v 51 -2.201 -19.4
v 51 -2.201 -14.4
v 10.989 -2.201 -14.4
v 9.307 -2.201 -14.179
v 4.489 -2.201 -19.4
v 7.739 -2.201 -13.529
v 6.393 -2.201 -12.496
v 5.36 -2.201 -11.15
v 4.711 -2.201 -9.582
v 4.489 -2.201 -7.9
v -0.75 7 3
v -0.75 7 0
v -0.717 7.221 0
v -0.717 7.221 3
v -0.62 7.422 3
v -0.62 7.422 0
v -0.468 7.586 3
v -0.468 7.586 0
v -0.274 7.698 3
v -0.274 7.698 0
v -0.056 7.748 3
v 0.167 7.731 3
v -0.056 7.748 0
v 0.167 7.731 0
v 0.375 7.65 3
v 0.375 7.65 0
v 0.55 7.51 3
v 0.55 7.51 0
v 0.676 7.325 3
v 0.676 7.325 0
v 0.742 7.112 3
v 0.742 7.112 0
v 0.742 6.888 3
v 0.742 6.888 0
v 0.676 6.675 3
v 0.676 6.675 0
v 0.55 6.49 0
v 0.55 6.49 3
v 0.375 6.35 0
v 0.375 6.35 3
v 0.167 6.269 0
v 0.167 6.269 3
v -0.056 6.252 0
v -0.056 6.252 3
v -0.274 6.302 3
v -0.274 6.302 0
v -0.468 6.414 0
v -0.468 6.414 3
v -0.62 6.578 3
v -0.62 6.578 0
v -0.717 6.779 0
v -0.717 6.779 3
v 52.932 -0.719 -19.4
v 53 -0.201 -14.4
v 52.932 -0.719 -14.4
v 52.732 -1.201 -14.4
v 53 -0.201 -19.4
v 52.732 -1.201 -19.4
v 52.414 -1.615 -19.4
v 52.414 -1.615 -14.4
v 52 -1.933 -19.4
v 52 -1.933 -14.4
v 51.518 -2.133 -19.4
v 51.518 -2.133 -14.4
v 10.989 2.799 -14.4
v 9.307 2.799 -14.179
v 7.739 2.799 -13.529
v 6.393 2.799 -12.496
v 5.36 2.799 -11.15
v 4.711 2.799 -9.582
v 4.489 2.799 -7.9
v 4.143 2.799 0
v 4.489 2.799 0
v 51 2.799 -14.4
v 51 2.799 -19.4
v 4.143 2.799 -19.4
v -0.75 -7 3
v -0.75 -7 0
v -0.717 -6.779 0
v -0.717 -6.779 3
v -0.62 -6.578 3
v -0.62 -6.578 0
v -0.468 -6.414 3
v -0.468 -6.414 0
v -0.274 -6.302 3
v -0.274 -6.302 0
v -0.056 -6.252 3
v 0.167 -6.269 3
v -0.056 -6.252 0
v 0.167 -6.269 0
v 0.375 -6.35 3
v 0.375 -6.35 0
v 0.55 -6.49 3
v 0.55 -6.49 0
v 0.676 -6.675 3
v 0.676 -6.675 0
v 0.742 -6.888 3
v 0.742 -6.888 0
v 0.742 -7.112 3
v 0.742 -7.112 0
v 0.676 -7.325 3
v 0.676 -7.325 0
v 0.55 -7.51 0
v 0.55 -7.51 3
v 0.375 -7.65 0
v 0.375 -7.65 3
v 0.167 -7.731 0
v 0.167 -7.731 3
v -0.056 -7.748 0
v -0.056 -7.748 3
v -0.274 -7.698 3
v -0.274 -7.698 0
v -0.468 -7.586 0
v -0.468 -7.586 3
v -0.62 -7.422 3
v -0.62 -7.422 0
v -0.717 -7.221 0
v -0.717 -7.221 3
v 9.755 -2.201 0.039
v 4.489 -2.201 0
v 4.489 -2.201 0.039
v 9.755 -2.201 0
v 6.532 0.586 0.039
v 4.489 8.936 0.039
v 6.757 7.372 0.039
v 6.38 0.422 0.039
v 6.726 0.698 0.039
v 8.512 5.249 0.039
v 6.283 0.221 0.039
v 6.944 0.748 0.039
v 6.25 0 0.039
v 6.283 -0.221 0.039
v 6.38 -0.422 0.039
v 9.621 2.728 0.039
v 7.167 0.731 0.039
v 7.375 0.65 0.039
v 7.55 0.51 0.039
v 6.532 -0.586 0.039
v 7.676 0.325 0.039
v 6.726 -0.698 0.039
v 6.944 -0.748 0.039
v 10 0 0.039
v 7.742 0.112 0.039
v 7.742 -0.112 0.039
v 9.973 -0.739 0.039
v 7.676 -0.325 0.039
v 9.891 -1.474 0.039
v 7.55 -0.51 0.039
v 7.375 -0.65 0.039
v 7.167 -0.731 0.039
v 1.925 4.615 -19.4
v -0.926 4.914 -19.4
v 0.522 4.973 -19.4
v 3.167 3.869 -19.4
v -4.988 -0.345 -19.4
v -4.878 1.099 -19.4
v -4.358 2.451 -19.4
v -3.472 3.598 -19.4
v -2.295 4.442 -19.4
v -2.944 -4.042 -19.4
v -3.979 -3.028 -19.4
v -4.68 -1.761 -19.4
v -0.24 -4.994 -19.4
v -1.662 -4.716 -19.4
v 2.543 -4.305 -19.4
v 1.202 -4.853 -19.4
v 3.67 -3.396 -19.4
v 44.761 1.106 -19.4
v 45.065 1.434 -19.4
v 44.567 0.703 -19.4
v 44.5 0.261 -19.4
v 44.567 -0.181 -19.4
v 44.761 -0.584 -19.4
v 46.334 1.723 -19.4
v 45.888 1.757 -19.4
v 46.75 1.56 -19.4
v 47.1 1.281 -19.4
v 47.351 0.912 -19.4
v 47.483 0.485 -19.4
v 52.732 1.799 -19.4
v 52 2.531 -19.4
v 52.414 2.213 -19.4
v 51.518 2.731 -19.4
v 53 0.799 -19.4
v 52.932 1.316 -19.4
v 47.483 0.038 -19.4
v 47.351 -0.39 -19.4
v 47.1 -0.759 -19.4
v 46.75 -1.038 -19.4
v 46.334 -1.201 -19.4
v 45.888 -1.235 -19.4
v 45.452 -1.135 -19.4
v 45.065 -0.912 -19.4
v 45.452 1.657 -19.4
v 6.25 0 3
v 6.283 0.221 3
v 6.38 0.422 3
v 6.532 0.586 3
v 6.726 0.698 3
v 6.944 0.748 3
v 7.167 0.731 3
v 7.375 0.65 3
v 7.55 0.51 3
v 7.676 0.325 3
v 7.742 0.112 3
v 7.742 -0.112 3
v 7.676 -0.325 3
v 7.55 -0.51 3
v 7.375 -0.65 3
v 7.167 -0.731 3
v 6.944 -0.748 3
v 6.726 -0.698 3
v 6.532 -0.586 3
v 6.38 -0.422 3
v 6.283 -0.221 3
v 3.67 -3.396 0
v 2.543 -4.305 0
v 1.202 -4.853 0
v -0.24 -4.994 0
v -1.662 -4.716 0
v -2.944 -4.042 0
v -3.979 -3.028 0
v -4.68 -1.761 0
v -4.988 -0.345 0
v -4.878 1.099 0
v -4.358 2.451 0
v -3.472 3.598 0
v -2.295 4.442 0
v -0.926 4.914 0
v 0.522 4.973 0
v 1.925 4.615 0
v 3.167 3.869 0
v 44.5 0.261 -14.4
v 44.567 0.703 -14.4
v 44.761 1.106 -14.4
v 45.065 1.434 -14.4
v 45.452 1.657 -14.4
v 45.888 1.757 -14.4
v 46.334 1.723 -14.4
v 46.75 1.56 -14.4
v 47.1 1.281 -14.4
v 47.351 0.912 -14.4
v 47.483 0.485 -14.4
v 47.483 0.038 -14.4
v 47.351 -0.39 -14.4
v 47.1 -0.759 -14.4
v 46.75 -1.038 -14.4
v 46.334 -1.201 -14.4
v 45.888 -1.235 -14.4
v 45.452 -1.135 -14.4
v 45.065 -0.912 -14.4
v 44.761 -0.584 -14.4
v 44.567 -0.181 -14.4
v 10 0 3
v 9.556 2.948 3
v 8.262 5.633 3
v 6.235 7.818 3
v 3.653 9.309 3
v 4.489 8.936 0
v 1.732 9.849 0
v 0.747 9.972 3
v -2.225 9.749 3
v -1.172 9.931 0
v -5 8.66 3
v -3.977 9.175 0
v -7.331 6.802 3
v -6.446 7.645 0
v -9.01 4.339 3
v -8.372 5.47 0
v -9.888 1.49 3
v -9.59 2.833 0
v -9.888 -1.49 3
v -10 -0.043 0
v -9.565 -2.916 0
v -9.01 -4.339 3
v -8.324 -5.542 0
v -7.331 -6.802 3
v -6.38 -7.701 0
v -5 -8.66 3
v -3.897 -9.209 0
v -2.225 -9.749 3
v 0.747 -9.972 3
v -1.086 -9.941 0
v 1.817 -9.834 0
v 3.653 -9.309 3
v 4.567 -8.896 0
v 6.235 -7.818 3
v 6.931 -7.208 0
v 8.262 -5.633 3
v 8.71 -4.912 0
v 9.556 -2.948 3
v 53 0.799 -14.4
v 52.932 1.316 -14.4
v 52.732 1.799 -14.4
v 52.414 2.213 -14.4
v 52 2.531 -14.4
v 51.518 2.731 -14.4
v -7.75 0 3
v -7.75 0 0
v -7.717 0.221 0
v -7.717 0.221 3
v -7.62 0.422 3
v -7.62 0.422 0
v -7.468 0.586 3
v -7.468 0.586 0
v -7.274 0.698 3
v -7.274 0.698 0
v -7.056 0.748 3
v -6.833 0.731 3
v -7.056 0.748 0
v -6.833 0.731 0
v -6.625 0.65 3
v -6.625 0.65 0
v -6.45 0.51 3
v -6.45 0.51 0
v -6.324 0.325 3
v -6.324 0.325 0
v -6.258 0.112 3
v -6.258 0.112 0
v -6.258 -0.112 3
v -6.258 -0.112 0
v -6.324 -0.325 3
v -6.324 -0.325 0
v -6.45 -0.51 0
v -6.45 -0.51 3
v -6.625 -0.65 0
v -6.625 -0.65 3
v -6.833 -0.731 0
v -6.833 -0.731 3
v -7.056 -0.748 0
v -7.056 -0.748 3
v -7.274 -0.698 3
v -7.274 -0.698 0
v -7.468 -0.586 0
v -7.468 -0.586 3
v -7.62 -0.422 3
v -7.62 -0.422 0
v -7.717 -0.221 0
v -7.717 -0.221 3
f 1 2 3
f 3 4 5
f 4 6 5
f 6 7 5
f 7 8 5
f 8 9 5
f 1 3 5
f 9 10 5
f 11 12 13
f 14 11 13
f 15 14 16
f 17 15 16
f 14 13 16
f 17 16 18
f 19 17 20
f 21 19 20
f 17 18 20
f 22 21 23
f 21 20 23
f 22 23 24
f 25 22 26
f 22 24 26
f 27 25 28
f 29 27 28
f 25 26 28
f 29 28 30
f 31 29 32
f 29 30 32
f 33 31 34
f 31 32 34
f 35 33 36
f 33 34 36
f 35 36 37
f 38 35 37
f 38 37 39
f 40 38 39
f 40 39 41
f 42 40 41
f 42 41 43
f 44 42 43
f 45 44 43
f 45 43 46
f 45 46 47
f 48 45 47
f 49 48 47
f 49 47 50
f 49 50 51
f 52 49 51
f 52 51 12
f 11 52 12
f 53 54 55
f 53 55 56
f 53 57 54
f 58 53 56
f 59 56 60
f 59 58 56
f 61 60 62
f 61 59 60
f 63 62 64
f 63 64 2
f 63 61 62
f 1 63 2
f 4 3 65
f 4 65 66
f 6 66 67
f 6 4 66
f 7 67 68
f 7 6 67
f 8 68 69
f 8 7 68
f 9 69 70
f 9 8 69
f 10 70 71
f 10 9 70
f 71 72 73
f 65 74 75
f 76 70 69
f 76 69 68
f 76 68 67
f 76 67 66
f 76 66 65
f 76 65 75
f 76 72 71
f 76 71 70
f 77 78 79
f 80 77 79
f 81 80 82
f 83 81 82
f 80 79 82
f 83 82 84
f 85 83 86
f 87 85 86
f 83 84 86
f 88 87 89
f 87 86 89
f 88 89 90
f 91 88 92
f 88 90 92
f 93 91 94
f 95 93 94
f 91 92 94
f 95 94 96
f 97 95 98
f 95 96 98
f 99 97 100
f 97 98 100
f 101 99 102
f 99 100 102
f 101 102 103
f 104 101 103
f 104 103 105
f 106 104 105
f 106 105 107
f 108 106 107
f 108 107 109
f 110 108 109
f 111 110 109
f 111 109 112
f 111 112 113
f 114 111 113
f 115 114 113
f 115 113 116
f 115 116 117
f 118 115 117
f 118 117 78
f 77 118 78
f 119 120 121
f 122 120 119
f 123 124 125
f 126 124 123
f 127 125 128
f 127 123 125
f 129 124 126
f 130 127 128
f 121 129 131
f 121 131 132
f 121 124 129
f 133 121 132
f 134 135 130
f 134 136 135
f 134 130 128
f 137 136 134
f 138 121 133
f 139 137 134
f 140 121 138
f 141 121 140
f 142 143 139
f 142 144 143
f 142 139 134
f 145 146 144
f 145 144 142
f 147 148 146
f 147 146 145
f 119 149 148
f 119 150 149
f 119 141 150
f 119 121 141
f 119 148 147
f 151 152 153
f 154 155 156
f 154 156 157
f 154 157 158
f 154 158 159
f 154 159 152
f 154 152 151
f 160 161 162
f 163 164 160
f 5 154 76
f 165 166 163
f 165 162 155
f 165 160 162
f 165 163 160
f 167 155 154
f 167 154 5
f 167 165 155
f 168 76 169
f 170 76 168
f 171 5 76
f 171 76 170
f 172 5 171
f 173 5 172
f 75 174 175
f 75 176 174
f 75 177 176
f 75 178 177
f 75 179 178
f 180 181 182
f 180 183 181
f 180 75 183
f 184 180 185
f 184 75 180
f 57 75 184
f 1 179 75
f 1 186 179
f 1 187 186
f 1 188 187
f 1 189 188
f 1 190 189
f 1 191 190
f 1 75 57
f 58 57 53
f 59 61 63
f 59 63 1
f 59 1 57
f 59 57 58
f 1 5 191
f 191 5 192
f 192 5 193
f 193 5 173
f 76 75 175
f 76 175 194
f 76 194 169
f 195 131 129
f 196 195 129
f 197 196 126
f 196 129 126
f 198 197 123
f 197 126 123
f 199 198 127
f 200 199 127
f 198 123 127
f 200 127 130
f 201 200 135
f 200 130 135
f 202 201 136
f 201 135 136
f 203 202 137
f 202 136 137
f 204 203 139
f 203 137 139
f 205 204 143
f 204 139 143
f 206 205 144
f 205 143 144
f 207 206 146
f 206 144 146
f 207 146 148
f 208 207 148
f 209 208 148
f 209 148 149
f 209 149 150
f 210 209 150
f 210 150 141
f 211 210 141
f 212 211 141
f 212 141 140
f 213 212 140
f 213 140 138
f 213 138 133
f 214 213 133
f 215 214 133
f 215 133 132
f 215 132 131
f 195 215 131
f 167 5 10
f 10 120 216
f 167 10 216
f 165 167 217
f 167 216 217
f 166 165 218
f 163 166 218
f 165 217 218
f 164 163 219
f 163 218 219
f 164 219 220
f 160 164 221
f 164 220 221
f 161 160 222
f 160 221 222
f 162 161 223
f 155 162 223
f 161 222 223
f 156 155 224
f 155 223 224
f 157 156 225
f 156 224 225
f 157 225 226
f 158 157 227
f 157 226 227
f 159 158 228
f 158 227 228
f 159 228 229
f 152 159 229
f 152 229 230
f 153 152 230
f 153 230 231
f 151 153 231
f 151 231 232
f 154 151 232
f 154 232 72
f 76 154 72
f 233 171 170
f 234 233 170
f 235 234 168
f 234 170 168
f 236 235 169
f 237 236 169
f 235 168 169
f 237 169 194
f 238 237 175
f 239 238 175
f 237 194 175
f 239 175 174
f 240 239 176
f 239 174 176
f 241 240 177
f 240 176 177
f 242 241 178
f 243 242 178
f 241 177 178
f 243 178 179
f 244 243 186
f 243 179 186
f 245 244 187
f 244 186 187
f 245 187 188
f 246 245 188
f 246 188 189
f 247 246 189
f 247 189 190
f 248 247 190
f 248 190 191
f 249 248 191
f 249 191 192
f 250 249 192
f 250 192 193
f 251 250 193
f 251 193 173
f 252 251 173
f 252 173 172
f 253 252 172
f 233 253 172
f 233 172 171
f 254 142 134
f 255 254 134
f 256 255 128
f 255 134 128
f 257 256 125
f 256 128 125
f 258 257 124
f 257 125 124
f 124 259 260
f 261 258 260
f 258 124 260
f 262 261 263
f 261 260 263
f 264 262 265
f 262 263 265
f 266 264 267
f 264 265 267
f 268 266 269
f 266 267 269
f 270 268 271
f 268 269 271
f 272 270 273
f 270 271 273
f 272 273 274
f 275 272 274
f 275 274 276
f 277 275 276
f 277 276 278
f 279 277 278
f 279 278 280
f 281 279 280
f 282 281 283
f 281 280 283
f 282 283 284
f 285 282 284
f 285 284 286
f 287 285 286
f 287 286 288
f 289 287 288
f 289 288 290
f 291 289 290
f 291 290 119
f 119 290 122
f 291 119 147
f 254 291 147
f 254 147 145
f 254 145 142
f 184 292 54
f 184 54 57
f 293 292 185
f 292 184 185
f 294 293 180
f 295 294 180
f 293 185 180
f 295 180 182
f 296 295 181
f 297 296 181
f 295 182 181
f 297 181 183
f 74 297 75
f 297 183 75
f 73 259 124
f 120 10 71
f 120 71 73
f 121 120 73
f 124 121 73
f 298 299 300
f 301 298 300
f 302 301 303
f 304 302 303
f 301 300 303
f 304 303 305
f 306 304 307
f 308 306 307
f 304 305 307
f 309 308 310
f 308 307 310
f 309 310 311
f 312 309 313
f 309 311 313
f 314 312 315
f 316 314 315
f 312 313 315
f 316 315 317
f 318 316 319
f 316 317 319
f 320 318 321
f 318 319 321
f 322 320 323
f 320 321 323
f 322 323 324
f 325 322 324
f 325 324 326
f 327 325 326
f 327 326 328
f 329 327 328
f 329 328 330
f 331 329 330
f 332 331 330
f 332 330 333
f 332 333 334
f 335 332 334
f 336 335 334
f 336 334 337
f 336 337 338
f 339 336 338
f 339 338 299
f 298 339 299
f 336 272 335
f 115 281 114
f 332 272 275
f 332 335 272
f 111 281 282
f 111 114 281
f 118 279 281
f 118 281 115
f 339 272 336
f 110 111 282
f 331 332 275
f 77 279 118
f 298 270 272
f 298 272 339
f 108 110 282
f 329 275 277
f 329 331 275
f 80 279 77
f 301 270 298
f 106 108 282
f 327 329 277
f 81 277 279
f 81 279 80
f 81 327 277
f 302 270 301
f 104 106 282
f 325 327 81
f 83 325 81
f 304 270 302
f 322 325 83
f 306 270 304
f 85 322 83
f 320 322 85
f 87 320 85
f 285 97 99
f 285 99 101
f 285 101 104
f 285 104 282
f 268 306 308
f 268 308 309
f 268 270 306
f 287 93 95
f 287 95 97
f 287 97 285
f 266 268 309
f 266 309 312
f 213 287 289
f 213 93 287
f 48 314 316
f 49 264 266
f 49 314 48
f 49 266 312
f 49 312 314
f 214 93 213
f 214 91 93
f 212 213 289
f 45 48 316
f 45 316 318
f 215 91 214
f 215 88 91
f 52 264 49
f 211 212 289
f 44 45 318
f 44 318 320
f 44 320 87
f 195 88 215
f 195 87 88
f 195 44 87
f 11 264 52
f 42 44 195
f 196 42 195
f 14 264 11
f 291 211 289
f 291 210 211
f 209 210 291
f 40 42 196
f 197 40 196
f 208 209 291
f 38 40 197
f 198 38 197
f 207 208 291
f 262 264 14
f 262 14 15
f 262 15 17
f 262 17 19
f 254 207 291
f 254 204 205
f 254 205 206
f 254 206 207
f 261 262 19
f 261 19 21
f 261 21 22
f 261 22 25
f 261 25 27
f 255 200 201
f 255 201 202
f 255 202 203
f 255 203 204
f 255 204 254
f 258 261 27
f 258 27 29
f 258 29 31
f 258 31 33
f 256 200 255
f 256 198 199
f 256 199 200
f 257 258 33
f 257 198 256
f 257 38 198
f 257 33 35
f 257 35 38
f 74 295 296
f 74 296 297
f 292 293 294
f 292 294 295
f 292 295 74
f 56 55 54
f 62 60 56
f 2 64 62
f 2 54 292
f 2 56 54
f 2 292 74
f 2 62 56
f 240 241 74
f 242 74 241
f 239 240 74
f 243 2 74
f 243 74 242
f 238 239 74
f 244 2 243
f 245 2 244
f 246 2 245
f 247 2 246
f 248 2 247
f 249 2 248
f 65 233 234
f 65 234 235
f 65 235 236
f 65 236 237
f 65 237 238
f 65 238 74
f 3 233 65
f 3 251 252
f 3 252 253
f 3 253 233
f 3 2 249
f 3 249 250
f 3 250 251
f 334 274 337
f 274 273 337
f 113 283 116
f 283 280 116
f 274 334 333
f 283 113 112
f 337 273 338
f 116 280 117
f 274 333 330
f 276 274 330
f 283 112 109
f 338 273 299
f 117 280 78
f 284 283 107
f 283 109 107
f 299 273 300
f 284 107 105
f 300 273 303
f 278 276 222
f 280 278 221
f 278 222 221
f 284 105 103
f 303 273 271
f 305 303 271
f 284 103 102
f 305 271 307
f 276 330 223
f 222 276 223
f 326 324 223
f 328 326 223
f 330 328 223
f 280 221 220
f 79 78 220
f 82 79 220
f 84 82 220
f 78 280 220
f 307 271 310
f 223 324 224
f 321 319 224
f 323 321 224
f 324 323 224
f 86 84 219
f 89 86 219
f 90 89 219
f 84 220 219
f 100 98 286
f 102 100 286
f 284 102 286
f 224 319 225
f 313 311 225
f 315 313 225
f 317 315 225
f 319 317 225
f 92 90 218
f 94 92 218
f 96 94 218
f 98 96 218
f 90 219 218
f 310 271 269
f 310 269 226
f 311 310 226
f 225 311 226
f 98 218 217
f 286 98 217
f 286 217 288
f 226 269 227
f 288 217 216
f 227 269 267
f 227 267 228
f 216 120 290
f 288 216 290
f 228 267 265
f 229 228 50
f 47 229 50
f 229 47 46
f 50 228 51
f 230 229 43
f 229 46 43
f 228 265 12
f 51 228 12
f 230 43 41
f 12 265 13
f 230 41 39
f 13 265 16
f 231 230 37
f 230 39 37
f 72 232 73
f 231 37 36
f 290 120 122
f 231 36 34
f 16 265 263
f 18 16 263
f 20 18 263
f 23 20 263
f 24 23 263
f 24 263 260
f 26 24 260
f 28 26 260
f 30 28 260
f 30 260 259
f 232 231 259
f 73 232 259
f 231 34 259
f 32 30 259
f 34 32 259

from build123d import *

# Parameters (mm, degrees)
SKETCH_1_R          = 10
EXTRUDE_1_DEPTH     = 3
SKETCH_2_R          = 0.75
CUT_EXTRUDE_1_DEPTH = 15.456832295
SKETCH_3_R          = 5
EXTRUDE_2_DEPTH     = 19.4
SKETCH_6_W          = 19.4
SKETCH_6_H          = 5
EXTRUDE_4_DEPTH     = 53
CUT_EXTRUDE_2_DEPTH = 58.742788457
SKETCH_8_R          = 1.5
CUT_EXTRUDE_3_DEPTH = 59.401712304
FILLET_1_R          = 2


with BuildPart() as part:
    # 草图1 → 凸台-拉伸1 (new body)
    with BuildSketch(Plane.XY):
        Circle(SKETCH_1_R)
    extrude(amount=EXTRUDE_1_DEPTH)

    # 草图2 → 切除-拉伸1 (cut, through all)
    with BuildSketch(Plane(origin=(0, 0, 0), x_dir=(-1, 0, 0), z_dir=(0, 0, -1))):
        with Locations((0, 7)):
            Circle(SKETCH_2_R)
        with Locations((7, 0)):
            Circle(SKETCH_2_R)
        with Locations((0, -7)):
            Circle(SKETCH_2_R)
        with Locations((-7, 0)):
            Circle(SKETCH_2_R)
    extrude(amount=-CUT_EXTRUDE_1_DEPTH, mode=Mode.SUBTRACT)

    # 草图3 → 凸台-拉伸2 (add)
    with BuildSketch(Plane(origin=(0, 0, 0), x_dir=(-1, 0, 0), z_dir=(0, 0, -1))):
        with Locations(Location((0, 0, 0), (0, 0, 180))):
            Circle(SKETCH_3_R)
    extrude(amount=EXTRUDE_2_DEPTH)

    # 草图6 → 凸台-拉伸4 (add)
    with BuildSketch(Plane(origin=(0, 0, 0), x_dir=(0, 0, -1), z_dir=(1, 0, 0))):
        with Locations((9.7, 0.298786174)):
            Rectangle(SKETCH_6_W, SKETCH_6_H)
    extrude(amount=EXTRUDE_4_DEPTH)

    # 草图7 → 切除-拉伸2 (cut, through all)
    with BuildSketch(Plane(origin=(0, -2.201213826, 0), x_dir=(-1, 0, 0), z_dir=(0, -1, 0))):
        with BuildLine():
            Line((-4.489393911, -0.038773437), (-53, -0.038773437))
            Line((-53, -0.038773437), (-53, 14.4))
            Line((-53, 14.4), (-10.989393911, 14.4))
            ThreePointArc((-10.989393911, 14.4), (-6.393199834, 12.496194078), (-4.489393911, 7.9))
            Line((-4.489393911, 7.9), (-4.489393911, -0.038773437))
        make_face()
    extrude(amount=-CUT_EXTRUDE_2_DEPTH, mode=Mode.SUBTRACT)

    # 草图8 → 切除-拉伸3 (cut, through all)
    with BuildSketch(Plane(origin=(0, 0, -19.4), x_dir=(-1, 0, 0), z_dir=(0, 0, -1))):
        with Locations((-46, 0.261084443)):
            Circle(SKETCH_8_R)
    extrude(amount=-CUT_EXTRUDE_3_DEPTH, mode=Mode.SUBTRACT)

    # 圆角1
    fillet_1_edges = [part.edges().sort_by_distance(p)[0] for p in [
        (53, 2.798786174, -16.9),
        (53, -2.201213826, -16.9),
    ]]
    fillet(fillet_1_edges, radius=FILLET_1_R)


solid = part.part
